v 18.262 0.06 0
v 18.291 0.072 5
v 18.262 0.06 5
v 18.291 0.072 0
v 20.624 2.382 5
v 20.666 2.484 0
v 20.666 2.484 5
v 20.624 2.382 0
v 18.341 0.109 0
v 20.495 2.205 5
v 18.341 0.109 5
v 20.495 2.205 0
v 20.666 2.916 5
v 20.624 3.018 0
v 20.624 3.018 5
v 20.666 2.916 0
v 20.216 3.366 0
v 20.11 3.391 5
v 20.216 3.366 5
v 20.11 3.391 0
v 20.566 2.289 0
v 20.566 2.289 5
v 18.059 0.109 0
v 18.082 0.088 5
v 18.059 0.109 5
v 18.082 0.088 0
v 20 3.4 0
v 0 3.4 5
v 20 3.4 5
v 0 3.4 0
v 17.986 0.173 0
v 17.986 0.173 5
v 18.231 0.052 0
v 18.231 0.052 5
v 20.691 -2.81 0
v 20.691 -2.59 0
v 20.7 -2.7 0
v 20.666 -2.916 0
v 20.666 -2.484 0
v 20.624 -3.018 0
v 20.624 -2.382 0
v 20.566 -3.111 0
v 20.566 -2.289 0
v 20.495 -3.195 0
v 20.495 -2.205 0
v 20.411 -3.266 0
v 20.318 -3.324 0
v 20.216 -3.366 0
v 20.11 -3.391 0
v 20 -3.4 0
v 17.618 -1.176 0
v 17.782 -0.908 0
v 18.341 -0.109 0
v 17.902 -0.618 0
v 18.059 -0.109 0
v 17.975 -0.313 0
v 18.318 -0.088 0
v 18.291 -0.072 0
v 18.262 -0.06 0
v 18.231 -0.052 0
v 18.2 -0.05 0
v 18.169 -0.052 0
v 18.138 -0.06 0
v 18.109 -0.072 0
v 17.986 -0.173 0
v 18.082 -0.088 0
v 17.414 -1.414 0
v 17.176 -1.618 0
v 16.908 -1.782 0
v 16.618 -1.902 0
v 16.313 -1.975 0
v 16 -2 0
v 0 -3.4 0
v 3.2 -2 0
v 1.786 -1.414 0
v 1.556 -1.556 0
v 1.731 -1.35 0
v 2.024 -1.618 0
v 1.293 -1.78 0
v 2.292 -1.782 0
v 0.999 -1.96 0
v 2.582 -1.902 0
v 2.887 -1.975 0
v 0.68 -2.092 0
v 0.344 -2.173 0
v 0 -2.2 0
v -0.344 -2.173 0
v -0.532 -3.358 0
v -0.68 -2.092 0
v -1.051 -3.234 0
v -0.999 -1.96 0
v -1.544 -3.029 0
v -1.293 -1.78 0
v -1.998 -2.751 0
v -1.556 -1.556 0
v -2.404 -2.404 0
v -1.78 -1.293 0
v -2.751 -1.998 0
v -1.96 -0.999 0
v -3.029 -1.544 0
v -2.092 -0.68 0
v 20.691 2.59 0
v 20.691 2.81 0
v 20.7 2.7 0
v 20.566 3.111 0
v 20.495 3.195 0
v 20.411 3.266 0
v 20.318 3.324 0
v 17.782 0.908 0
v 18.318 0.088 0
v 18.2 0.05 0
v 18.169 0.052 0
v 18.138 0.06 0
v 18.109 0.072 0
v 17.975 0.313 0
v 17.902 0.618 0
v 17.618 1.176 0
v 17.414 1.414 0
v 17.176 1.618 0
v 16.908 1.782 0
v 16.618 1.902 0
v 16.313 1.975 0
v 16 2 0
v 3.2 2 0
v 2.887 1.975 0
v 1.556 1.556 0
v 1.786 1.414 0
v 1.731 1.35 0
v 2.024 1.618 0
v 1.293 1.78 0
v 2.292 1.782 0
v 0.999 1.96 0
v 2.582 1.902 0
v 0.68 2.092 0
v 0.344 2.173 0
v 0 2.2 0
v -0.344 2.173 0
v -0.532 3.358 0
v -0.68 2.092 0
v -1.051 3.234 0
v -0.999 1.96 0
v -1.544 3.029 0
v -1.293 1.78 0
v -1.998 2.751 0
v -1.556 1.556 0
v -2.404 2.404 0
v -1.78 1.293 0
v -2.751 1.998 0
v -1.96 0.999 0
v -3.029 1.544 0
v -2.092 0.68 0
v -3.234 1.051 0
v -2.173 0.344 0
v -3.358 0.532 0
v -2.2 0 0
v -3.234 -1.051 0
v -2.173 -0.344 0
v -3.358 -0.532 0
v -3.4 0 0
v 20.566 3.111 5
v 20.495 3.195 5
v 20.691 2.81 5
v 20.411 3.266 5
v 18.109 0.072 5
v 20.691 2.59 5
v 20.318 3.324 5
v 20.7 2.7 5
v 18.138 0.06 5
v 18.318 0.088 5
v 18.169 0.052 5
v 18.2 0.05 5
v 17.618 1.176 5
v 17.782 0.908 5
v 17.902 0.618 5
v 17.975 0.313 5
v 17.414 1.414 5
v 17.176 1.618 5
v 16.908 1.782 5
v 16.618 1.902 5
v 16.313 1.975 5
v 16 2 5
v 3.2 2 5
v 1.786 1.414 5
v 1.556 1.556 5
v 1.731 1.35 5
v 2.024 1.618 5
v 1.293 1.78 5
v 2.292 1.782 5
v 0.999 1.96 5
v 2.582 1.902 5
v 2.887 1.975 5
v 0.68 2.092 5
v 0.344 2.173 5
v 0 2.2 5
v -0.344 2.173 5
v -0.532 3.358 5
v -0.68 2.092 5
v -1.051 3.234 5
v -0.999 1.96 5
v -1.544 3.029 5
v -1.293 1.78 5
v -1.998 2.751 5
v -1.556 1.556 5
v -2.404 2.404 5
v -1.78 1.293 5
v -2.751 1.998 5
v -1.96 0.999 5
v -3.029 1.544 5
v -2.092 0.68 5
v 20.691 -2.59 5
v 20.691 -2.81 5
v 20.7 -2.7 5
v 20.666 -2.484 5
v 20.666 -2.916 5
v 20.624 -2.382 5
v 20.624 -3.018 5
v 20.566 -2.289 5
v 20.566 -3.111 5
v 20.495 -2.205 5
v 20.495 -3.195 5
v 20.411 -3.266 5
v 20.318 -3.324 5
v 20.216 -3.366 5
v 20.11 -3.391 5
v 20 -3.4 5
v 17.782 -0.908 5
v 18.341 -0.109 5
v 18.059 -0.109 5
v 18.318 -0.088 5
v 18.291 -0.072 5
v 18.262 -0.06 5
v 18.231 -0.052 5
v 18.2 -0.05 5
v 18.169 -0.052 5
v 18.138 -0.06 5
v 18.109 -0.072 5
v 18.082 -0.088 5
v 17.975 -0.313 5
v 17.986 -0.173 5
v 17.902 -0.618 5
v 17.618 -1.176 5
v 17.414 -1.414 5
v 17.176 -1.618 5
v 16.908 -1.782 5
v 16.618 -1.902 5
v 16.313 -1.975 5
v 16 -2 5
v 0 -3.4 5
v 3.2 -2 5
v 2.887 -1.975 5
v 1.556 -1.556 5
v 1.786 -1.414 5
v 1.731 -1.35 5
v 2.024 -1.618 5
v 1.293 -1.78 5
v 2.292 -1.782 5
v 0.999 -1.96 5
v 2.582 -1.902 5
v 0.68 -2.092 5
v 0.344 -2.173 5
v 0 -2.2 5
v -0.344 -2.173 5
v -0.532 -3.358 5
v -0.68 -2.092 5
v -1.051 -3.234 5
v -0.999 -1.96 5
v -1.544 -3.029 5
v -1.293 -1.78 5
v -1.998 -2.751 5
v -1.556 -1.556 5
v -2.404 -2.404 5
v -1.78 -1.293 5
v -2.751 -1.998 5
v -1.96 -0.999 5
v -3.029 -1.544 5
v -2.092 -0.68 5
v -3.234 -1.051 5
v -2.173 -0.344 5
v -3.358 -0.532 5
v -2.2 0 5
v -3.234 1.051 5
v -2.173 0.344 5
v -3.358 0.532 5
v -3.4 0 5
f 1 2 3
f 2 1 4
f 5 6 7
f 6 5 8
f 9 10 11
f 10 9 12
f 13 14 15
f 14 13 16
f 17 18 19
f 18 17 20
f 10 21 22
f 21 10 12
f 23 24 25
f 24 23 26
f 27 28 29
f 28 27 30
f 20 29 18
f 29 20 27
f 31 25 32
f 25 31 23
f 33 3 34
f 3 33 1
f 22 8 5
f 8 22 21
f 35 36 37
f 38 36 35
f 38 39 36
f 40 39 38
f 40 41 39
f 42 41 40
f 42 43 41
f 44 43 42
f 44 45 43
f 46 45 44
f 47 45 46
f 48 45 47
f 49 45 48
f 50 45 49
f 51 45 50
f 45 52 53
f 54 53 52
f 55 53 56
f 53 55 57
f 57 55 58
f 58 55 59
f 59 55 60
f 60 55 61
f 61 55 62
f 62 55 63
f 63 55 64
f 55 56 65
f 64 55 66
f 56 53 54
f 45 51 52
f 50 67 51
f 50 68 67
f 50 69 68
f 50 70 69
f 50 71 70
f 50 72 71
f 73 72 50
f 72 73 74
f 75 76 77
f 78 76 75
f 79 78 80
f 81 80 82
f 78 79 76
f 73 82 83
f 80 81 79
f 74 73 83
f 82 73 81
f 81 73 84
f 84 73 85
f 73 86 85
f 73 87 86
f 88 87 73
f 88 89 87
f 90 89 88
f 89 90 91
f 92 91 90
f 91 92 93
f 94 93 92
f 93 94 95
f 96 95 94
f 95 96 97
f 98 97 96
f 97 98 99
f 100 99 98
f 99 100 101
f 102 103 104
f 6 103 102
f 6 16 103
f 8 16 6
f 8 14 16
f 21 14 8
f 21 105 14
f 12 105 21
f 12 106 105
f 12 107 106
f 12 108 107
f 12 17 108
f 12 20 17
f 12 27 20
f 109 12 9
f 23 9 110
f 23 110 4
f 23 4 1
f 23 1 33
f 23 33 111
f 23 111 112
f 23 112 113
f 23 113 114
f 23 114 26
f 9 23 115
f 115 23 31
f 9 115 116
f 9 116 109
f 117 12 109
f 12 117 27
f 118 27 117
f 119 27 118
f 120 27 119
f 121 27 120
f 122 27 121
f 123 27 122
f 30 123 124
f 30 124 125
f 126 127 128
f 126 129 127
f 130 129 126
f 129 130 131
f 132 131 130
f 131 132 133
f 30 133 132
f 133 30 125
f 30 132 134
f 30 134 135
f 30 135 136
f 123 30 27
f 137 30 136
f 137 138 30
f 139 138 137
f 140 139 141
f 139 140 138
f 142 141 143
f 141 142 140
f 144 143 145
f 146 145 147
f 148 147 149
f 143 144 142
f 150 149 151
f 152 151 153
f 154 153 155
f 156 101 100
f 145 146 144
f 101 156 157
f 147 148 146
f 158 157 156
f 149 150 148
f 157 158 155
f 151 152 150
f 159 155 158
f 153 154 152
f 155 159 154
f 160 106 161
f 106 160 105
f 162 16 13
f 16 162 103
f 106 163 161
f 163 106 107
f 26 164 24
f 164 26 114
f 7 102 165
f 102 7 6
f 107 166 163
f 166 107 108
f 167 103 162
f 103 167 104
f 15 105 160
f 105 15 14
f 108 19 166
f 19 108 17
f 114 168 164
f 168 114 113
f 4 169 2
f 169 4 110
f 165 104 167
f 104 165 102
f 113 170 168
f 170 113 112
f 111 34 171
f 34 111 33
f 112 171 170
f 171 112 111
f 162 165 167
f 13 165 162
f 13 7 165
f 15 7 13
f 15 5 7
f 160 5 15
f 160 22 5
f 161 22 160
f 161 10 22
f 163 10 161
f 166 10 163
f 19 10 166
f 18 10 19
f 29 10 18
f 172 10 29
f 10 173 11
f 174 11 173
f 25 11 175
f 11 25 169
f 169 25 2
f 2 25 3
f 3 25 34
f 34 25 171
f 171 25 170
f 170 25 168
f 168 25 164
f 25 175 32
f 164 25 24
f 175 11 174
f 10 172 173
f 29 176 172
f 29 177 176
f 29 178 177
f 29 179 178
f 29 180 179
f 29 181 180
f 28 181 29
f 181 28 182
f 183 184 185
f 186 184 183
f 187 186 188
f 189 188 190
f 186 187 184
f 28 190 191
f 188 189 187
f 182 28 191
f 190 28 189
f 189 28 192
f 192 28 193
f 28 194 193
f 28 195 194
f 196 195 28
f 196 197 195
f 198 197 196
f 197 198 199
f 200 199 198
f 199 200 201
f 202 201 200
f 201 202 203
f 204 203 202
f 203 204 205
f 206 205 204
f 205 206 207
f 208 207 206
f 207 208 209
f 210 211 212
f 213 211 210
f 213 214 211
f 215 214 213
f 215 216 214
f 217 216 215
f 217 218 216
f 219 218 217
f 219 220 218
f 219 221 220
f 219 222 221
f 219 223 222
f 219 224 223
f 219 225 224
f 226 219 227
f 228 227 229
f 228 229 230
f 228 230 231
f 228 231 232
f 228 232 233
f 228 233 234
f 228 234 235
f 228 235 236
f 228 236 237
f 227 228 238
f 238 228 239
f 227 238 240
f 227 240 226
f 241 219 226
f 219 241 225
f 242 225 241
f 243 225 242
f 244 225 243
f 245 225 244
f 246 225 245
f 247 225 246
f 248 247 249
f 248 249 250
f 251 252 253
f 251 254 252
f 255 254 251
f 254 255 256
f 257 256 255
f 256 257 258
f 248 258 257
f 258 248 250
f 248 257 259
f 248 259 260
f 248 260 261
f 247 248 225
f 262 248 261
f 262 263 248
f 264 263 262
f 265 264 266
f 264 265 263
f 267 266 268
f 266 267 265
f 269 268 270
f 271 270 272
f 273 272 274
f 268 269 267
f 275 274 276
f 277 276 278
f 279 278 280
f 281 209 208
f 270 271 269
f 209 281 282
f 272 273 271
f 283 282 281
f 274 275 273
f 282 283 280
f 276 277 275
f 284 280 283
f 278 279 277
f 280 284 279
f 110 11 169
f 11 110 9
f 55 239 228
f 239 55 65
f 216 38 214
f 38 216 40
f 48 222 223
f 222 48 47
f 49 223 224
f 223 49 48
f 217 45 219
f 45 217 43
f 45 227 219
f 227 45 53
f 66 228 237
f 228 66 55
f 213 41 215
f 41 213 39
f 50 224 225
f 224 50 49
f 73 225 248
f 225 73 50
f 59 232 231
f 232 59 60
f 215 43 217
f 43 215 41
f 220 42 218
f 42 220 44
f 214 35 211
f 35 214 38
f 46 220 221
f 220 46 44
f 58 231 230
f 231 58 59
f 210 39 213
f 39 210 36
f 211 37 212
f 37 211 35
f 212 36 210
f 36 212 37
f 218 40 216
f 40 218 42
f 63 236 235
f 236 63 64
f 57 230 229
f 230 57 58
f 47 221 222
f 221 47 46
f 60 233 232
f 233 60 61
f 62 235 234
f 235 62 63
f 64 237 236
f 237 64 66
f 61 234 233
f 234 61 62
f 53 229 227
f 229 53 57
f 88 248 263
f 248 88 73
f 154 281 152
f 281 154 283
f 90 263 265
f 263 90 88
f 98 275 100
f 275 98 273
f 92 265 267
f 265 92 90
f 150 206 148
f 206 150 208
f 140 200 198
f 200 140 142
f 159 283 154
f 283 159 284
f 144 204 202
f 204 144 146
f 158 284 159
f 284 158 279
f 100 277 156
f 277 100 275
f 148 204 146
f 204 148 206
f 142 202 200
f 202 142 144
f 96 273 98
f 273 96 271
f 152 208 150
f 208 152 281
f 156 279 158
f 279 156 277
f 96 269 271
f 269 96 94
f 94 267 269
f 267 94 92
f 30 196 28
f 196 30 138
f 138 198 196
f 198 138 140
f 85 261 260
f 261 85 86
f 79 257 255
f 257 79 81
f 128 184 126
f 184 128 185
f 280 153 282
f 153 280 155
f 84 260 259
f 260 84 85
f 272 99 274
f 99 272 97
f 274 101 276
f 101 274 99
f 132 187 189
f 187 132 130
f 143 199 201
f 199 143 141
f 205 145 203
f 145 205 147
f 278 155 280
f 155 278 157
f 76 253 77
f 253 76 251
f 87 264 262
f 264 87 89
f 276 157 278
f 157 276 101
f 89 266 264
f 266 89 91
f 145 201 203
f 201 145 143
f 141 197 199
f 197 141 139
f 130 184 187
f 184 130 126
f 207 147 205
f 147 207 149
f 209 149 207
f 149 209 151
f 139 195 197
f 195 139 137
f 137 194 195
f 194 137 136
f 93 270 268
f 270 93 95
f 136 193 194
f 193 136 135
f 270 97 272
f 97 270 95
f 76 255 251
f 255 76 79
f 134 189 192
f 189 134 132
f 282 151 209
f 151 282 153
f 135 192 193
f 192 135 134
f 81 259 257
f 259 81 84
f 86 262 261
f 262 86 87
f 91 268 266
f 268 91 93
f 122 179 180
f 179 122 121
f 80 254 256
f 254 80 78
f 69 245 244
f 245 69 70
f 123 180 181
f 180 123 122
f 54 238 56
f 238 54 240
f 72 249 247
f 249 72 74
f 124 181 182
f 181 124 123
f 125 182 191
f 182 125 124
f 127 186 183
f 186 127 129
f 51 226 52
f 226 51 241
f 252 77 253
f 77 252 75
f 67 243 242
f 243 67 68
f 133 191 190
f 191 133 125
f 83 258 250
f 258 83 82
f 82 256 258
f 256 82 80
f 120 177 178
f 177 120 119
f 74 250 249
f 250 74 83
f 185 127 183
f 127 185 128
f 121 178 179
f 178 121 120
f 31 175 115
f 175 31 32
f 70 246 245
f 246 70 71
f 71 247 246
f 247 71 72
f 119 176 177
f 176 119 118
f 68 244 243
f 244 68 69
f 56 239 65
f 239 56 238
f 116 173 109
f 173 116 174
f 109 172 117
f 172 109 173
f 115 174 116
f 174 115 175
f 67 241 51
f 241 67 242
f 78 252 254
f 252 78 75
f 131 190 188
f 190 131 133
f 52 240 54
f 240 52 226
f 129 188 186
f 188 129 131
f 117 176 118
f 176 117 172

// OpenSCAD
// Cable Thickness (mm)
g_cable_d = 4; // [1:0.1:6]

// Cable Loops
g_cable_loops = 5; // [2:10]

// Clip Thickness
g_clip_thickness = 1.2; // [1.2:0.4:3.2]

// Below are not customizer vars.
 module __Customizer_Limit__ () {}

$fn=40;

// Clip Height
g_clip_height = 5;

module clip(cable_d, cable_loops, clip_thickness, clip_height, debug=false) {
    cutout_height = clip_height + 0.1;
    cutout_translate = [0,0,-0.05];
    
    if (debug) {
        // Loops:
        #color("blue") loops(cable_d, cable_loops, clip_thickness, clip_height);
    }
    
    difference() {
        hinge_finangle = 0.4;
        // Adding a value to the clip_thickness so it becomes "minimum" clip thickness
        // due to the slightly enlarged hinge cutout:
        outer_shape(cable_d, cable_loops, clip_thickness + hinge_finangle/2, clip_height, debug);
        
        translate(cutout_translate) {
            // The first cutout is slightly bigger - allows sliding, and means
            // if the tolerances are tight the hinge won't be wedged slightly open.
            cylinder(d=cable_d + hinge_finangle, h=cutout_height);
            hull() {
                translate([cable_d * 0.8,0,0]) cylinder(d=cable_d, h=cutout_height);
                translate([cable_d * (cable_loops-1),0,0]) cylinder(d=cable_d, h=cutout_height);
            }
        }
    }
}

module outer_shape(cable_d, cable_loops, clip_thickness, clip_height, debug) {
    cable_r = cable_d / 2;
    
    // Outer Shell:
    union() {
        hull() {
            cylinder(r=cable_r + clip_thickness, h=clip_height);
            translate([cable_d * (cable_loops - 1), 0, 0])
                translate([0,-(cable_r + clip_thickness),0])
                cube([0.0001, 2 * (cable_r + clip_thickness), clip_height]);
                //cylinder(r=cable_r + clip_thickness, h=clip_height);
            
        }

        translate([cable_d * (cable_loops - 1), 0, 0]) {
            // Top Triangle:
            triangle(cable_d, clip_thickness, clip_height);
        
            // Bottom Triangle:
            translate([0,0,clip_height])
            rotate([180, 0, 0])
                triangle(cable_d, clip_thickness, clip_height);
        }
    }
}

module triangle(cable_d, clip_thickness, clip_height) {
    cable_r = cable_d / 2;

    triangle_corner = 0.2;  // Radius of most of the triangle points
    end_corner = clip_thickness / 2; // Divided by two because it's a radius
    clip_ease = cable_d; // "Pointiness of clip arms
    finangle = 0.05; // Just move the touching parts away, so they're not joined.

    hull() {
            translate([0, cable_r + clip_thickness - triangle_corner, 0])
                cylinder(r=triangle_corner, h=clip_height);
            translate([0, cable_r + triangle_corner, 0])
                cylinder(r=triangle_corner, h=clip_height);
            // Inside point:
            translate([cable_r + triangle_corner, triangle_corner + finangle, 0])
                cylinder(r=triangle_corner, h=clip_height);
            // This is the pointy-end:
            translate([clip_ease, cable_r + clip_thickness - end_corner, 0])
                cylinder(r=end_corner, h=clip_height);
        }
    }

module loops(cable_d, cable_loops, clip_thickness, clip_height) {
    height = clip_height + 1;
    for (loop = [0 : cable_loops - 1]) {
        translate([cable_d * loop,0,-0.5])
            cylinder(d=cable_d, h=height, $fn=20);
    }
}

clip(g_cable_d, g_cable_loops, g_clip_thickness, g_clip_height);
